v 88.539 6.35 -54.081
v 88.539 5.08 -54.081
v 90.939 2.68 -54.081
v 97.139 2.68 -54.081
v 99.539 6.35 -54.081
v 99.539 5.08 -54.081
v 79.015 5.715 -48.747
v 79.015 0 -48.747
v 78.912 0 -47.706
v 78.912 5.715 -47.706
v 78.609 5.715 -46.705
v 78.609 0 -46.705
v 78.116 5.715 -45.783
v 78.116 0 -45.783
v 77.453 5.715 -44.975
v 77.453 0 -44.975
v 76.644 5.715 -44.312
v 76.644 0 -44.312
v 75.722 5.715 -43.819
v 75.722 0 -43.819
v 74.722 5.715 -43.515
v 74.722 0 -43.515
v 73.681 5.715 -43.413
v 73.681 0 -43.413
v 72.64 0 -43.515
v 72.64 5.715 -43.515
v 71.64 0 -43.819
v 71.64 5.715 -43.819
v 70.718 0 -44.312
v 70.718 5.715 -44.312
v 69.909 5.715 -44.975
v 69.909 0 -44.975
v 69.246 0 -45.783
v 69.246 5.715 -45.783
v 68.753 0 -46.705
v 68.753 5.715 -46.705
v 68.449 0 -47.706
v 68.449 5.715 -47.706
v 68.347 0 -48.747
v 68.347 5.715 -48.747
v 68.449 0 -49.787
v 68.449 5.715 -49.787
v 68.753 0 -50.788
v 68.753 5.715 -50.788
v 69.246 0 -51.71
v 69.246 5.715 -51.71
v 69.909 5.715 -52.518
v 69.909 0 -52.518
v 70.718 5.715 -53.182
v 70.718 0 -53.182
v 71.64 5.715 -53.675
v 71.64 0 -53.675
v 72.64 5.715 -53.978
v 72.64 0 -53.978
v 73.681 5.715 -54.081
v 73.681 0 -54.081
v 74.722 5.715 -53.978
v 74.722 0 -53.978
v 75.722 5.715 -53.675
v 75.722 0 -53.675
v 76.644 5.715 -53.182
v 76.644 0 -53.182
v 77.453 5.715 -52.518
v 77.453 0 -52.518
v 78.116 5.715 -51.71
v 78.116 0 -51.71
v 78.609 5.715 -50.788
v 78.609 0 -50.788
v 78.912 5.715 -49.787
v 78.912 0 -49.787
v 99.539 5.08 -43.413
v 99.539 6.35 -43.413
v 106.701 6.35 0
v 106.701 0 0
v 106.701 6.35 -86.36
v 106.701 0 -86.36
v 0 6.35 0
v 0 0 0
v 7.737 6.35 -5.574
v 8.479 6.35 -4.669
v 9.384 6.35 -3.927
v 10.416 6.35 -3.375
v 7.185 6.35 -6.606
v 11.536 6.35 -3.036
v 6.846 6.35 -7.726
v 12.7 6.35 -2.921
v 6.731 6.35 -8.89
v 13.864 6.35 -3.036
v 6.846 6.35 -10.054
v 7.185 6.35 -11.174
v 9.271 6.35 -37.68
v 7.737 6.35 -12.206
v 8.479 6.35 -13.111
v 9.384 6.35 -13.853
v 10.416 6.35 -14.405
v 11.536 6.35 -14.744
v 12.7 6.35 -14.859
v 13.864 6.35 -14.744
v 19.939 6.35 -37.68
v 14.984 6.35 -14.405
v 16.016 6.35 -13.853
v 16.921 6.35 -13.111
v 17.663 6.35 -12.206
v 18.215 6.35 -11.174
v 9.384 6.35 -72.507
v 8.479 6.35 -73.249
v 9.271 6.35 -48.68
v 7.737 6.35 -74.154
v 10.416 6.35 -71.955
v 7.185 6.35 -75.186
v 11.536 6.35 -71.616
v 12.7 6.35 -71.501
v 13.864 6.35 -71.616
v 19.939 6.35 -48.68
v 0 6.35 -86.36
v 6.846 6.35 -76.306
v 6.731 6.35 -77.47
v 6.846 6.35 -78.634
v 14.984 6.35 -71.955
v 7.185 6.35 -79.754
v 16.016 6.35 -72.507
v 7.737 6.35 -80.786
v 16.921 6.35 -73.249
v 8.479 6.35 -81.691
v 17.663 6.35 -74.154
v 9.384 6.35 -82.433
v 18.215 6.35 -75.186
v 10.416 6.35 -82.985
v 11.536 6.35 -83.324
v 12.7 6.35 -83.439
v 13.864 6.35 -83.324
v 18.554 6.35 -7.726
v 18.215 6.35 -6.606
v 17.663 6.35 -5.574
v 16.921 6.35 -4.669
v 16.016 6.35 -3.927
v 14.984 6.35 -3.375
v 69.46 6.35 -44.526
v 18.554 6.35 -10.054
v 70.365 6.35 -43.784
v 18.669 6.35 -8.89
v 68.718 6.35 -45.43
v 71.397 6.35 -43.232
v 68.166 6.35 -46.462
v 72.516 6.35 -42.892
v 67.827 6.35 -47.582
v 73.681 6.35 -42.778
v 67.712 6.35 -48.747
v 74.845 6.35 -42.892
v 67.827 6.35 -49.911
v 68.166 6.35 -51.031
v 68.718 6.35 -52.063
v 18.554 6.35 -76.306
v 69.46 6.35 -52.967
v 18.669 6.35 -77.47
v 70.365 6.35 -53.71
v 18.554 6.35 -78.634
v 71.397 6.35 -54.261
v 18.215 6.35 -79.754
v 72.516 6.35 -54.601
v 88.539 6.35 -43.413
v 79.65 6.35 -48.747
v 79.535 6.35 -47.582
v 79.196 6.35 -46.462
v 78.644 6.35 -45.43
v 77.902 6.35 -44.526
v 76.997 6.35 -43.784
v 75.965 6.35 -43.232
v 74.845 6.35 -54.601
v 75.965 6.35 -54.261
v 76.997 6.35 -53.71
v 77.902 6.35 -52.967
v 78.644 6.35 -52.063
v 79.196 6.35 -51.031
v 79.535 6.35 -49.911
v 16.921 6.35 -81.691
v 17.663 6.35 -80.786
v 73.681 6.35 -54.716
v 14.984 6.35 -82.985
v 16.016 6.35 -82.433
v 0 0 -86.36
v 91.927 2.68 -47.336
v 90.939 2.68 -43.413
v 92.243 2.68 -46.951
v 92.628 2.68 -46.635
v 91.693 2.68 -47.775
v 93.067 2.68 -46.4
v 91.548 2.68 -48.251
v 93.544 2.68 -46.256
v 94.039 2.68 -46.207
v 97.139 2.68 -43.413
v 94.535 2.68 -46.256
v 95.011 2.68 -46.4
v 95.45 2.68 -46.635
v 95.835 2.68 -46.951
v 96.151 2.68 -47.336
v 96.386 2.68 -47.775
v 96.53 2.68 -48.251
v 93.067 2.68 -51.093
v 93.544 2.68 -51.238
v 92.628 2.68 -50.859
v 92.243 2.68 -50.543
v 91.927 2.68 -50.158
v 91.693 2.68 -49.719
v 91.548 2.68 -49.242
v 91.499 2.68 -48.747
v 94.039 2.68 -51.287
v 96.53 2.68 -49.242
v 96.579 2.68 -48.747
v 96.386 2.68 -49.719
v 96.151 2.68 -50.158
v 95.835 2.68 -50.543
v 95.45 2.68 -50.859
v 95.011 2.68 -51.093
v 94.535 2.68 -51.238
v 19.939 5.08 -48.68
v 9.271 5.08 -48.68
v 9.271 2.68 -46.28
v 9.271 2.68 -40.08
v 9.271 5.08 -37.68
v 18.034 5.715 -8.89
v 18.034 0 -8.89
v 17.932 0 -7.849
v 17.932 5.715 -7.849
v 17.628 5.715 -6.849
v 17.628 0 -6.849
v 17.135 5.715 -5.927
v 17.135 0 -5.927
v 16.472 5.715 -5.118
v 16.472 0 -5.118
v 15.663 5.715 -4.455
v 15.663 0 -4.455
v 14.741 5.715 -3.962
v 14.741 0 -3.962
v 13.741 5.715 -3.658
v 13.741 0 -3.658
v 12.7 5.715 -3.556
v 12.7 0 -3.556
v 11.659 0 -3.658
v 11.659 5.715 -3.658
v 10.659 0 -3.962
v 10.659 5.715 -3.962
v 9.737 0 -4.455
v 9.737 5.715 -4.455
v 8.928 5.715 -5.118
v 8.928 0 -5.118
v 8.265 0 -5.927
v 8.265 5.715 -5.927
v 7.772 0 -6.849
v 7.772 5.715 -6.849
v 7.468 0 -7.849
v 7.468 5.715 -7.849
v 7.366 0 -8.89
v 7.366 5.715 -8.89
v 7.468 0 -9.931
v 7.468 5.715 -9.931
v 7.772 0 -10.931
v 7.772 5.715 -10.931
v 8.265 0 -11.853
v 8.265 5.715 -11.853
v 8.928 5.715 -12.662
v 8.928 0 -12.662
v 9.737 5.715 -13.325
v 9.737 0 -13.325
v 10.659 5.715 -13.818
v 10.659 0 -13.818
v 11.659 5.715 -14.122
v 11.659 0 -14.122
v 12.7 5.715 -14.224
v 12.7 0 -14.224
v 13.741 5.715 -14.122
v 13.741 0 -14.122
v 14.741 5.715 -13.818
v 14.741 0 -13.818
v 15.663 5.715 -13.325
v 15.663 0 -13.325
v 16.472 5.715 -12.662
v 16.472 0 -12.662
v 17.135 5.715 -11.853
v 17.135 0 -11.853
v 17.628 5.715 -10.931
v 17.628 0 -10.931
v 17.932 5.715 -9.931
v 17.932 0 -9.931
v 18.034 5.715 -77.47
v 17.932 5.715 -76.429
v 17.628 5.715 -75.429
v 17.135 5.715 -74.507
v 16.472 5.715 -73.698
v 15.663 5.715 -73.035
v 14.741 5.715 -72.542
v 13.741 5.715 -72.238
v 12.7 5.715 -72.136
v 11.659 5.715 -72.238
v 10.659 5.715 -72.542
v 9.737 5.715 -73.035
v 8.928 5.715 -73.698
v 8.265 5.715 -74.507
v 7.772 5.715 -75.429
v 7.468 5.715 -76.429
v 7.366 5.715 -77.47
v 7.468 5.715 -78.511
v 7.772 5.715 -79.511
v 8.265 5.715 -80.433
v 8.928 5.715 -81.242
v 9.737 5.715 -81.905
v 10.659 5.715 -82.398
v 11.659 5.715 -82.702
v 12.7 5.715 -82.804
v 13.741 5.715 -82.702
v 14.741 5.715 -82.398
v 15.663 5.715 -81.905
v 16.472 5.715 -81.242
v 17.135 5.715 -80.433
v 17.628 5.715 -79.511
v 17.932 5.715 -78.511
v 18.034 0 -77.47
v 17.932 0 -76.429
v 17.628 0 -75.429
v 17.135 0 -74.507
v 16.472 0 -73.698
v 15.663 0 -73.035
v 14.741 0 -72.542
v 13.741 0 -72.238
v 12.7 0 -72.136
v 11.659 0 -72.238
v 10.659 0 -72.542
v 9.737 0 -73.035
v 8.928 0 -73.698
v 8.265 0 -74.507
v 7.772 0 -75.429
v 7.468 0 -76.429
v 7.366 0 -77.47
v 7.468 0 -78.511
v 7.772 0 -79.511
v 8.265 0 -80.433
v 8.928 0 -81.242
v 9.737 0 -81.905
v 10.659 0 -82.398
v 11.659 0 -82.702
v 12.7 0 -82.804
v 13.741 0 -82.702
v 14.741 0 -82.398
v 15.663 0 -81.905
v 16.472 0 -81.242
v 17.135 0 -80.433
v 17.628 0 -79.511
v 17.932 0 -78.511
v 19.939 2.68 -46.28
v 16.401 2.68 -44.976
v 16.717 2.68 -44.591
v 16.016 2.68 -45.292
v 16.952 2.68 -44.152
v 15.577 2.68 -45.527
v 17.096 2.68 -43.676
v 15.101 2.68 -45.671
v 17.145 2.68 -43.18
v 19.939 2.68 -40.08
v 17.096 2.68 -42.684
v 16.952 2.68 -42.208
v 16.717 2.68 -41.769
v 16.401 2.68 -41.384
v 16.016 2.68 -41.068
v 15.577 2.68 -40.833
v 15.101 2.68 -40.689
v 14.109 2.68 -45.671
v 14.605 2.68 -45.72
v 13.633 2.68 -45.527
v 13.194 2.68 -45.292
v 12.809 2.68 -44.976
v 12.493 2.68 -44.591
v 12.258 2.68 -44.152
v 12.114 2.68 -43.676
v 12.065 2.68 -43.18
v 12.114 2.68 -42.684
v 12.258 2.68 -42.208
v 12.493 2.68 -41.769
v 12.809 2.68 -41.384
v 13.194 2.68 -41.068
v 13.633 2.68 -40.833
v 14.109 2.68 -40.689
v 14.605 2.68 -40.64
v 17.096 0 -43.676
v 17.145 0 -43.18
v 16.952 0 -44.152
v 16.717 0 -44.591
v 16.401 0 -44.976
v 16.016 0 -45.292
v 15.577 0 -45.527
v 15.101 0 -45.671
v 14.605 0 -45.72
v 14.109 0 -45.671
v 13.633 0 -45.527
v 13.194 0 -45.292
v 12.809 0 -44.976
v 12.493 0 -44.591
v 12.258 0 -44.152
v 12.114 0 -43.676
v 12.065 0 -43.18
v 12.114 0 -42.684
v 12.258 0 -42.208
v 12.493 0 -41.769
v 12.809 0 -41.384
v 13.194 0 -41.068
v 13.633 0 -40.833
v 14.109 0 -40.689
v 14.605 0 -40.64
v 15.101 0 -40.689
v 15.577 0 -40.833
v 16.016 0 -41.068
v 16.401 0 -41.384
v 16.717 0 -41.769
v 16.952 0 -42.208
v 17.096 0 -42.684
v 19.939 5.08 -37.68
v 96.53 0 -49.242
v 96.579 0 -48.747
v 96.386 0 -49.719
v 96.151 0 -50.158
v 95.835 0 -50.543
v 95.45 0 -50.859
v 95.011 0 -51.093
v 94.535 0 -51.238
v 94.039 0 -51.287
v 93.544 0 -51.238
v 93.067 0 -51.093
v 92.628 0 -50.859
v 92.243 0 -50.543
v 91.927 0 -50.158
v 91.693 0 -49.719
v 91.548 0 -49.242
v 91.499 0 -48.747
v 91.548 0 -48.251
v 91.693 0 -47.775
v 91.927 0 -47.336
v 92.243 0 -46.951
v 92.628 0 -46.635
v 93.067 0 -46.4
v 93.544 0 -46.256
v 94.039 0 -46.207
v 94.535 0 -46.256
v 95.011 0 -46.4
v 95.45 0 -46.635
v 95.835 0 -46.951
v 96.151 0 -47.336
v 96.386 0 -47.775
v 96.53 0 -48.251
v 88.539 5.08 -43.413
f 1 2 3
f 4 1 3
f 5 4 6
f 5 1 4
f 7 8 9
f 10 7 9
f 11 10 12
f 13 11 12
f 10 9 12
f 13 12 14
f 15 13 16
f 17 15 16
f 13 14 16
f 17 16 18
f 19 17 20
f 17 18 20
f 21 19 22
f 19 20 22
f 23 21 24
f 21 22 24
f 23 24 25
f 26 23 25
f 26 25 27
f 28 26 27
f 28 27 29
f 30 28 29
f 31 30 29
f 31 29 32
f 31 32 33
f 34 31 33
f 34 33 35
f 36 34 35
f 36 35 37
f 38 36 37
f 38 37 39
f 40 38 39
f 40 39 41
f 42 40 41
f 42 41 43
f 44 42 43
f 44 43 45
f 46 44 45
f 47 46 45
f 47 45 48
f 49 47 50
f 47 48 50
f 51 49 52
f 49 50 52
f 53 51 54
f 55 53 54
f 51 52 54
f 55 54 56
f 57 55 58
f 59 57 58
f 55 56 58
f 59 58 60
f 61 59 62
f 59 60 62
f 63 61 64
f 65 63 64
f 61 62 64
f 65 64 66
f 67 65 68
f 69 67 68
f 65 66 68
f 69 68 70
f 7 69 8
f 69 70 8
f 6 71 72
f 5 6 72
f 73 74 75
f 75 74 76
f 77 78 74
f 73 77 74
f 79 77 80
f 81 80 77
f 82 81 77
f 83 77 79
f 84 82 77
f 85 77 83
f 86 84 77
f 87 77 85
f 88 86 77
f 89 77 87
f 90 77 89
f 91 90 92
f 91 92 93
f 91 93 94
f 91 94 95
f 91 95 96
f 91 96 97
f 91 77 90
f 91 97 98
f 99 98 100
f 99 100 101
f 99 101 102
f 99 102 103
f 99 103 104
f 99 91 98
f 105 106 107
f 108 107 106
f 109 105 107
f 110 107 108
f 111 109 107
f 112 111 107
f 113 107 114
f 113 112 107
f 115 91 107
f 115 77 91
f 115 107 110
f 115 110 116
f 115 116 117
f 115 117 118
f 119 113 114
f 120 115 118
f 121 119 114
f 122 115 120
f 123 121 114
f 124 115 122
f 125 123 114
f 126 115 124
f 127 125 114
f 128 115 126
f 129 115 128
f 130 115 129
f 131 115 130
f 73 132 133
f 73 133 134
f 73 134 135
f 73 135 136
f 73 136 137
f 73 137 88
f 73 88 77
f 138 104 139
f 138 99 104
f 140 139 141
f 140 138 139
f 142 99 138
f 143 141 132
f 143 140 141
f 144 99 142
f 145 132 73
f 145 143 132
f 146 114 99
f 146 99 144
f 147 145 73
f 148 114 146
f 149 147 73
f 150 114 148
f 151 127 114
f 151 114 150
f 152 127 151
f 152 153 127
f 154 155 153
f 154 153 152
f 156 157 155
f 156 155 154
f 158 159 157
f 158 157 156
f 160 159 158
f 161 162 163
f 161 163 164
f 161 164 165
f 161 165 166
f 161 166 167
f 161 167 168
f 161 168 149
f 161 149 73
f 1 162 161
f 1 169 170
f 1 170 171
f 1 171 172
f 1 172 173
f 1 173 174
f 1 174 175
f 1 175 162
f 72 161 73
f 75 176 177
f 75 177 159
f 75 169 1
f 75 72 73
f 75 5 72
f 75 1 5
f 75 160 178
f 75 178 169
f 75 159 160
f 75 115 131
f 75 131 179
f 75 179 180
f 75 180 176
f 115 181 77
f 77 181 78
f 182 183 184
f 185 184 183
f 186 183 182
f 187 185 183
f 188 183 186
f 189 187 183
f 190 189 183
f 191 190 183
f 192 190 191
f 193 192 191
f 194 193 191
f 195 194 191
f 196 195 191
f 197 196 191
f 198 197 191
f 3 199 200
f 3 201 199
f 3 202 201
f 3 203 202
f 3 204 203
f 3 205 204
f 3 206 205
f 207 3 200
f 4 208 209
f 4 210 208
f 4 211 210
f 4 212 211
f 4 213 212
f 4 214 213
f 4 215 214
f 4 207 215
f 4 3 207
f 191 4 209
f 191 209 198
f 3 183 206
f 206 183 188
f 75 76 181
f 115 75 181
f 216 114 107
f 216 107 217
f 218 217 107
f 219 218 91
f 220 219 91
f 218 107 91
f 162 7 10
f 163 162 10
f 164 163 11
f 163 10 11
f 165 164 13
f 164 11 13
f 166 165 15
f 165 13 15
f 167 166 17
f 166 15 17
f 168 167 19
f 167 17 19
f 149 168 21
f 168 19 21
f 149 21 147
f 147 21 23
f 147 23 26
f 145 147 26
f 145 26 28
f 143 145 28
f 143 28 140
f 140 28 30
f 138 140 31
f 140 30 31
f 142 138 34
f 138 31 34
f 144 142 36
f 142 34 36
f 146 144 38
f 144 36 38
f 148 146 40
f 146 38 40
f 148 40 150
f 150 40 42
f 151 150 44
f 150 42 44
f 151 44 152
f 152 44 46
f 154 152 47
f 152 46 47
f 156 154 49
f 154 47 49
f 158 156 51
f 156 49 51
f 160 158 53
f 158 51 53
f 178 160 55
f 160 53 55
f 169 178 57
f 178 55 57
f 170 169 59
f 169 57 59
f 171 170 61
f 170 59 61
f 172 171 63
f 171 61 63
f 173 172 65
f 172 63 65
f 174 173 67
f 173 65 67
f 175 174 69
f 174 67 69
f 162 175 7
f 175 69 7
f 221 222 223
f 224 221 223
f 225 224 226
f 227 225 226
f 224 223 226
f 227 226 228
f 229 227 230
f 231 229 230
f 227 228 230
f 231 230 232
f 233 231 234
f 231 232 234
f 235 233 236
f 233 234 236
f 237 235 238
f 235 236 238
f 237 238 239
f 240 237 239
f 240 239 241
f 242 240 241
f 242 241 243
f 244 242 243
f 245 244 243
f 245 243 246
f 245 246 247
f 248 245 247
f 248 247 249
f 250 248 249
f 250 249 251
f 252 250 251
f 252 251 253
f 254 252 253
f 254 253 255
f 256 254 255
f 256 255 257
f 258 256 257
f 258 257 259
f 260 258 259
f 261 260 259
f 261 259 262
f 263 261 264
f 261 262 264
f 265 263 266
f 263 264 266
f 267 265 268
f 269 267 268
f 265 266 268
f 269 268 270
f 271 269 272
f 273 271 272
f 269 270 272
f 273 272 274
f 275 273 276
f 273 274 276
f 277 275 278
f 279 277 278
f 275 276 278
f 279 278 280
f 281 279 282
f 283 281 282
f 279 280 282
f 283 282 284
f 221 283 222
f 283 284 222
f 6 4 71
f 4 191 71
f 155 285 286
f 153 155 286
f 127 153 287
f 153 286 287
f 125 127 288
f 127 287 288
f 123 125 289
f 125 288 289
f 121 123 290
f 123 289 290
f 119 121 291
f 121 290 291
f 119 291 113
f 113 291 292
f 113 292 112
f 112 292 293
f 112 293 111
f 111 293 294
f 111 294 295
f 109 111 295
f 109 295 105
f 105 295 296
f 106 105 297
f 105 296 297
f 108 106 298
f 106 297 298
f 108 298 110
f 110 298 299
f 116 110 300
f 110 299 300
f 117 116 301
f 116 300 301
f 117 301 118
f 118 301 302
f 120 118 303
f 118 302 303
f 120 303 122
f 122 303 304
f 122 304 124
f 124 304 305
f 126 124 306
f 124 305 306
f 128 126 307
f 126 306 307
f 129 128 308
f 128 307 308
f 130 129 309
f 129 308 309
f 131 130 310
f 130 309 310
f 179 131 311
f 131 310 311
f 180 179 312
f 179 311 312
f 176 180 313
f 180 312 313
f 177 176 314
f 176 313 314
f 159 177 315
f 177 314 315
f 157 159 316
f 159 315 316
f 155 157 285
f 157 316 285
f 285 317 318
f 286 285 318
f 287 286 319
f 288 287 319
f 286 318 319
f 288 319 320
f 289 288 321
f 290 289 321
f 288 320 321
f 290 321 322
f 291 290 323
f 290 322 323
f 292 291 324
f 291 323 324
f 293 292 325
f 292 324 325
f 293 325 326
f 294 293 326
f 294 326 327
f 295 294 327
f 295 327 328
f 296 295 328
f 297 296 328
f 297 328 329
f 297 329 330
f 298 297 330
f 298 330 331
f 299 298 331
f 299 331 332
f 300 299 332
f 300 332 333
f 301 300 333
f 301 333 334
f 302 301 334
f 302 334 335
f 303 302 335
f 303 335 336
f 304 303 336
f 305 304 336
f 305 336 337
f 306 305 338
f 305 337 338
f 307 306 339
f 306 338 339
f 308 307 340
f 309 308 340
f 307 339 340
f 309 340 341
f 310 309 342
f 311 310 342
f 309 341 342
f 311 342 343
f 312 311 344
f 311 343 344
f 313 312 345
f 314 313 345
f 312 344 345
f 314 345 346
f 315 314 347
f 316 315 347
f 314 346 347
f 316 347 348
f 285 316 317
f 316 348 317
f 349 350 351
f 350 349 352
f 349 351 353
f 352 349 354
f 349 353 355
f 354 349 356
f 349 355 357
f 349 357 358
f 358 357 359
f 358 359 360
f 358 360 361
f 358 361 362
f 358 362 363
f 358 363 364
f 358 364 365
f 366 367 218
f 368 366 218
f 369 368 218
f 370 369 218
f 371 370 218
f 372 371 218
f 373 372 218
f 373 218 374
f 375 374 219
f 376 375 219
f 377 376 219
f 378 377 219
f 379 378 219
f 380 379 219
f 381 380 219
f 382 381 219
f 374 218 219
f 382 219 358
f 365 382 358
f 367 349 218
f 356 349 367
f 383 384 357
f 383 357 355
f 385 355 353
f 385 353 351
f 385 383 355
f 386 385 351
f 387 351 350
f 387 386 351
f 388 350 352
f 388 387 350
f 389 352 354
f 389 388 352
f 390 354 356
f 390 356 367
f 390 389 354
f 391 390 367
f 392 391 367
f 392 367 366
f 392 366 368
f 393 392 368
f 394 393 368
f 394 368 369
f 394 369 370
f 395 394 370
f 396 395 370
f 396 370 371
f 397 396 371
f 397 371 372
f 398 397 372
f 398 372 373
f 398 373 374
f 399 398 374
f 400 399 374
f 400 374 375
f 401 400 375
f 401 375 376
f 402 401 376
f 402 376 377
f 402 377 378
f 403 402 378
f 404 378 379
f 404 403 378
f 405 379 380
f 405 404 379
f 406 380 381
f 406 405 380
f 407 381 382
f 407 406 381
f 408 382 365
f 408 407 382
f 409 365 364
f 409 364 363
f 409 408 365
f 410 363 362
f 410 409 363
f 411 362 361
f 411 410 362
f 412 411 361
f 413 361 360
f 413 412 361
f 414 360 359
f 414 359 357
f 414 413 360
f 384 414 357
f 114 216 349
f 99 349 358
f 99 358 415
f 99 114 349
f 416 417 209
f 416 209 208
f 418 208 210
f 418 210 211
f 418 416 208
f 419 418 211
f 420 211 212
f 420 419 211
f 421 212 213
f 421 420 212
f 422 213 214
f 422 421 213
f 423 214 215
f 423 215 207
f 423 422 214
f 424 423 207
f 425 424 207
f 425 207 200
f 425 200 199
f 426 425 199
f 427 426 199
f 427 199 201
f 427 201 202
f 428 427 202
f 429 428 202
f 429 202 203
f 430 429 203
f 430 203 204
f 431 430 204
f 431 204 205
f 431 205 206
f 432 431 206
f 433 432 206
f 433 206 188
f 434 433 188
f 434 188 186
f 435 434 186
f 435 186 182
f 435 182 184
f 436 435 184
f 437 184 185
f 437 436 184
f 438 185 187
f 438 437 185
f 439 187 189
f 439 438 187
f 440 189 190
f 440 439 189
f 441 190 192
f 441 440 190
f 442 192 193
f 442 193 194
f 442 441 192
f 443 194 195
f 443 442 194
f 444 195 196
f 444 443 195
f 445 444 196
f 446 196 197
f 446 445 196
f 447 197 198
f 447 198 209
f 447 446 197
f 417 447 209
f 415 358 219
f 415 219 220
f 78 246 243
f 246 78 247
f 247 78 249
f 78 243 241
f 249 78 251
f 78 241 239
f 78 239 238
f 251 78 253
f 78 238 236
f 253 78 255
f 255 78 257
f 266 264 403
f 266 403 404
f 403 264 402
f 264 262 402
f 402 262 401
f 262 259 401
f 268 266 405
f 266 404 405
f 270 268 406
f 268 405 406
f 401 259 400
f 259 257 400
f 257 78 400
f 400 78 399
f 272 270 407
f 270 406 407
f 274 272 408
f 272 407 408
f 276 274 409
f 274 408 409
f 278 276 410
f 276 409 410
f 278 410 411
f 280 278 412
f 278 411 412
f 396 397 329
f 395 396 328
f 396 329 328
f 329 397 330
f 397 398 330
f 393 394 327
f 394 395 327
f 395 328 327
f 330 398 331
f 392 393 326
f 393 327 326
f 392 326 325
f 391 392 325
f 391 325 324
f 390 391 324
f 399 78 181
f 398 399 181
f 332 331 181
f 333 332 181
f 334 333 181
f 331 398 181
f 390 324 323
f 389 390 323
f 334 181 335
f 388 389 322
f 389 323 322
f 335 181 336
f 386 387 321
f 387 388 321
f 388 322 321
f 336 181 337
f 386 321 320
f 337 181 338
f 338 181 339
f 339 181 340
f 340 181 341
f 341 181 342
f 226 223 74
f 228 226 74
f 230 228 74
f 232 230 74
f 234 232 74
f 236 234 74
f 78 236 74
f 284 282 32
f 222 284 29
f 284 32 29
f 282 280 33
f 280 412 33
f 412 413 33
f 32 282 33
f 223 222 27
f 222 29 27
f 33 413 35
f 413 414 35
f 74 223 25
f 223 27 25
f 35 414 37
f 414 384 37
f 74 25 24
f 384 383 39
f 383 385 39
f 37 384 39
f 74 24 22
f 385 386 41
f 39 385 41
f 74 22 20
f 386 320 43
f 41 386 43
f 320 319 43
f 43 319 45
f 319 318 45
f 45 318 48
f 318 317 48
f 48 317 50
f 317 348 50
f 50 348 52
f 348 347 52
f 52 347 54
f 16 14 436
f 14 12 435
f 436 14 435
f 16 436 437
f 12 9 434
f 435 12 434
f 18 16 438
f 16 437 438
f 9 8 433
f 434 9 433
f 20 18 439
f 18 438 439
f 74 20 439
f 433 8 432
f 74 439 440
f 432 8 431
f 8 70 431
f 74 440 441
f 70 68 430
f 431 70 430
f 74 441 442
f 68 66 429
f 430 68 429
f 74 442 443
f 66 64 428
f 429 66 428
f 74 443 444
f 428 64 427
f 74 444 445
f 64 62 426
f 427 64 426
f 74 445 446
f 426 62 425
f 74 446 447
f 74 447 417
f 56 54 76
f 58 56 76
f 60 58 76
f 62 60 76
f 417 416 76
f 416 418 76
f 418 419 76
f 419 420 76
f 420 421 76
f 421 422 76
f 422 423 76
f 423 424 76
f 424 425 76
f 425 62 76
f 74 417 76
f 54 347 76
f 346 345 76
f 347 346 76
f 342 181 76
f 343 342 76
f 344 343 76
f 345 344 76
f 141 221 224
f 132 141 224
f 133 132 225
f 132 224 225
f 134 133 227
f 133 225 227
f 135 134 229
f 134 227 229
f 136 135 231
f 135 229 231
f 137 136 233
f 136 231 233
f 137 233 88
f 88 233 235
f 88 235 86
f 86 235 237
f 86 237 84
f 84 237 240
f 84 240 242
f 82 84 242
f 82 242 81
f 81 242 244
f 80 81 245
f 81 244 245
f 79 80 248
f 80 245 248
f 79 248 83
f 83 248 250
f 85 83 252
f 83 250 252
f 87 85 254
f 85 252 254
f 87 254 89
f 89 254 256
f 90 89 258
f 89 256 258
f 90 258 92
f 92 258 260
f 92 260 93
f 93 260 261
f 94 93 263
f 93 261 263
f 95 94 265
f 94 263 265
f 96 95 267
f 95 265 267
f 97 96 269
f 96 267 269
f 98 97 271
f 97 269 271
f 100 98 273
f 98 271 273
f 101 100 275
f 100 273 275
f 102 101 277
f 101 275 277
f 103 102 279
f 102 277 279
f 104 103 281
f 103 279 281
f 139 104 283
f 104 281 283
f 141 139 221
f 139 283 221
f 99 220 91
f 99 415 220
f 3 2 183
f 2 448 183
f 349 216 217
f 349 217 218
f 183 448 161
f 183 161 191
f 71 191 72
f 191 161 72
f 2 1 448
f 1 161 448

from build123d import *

# Parameters (mm, degrees)
SKETCH1_R               = 2.54
BOSS_EXTRUDE1_DEPTH     = 6.35
CUT_EXTRUDE1_DEPTH      = 5.334
CUT_EXTRUDE1_DEPTH_BACK = 5.334
CUT_EXTRUDE2_DEPTH      = 5.334
CUT_EXTRUDE2_DEPTH_BACK = 5.334
SKETCH6_R               = 5.334
CUT_EXTRUDE3_DEPTH      = 7.35
CHAMFER1_SIZE           = 0.635


with BuildPart() as part:
    # Sketch1 → Boss-Extrude1 (new body)
    with BuildSketch(Plane(origin=(0, 0, 0), x_dir=(1, 0, 0), z_dir=(0, 1, 0))):
        Polygon((0, 33.02), (0, 0), (22.86, 0), (106.700989027, 0), (106.700989027, 38.586695169), (106.700989027, 56.366695169), (106.700989027, 86.36), (20.32, 86.36), (0, 86.36), (0, 53.34), align=None)
        with Locations((14.605, 43.18)):
            Circle(SKETCH1_R, mode=Mode.SUBTRACT)
        with Locations((94.039183737, 48.746695169)):
            Circle(SKETCH1_R, mode=Mode.SUBTRACT)
    extrude(amount=BOSS_EXTRUDE1_DEPTH)

    # Sketch4 → Cut-Extrude1 (cut, two sides)
    with BuildSketch(Plane.ZY.offset(-14.605)) as cut_extrude1_sk:
        Polygon((-46.28, 2.68), (-40.08, 2.68), (-37.68, 5.08), (-37.68, 6.35), (-48.68, 6.35), (-48.68, 5.08), align=None)
    extrude(amount=CUT_EXTRUDE1_DEPTH, mode=Mode.SUBTRACT)
    extrude(cut_extrude1_sk.sketch, amount=-CUT_EXTRUDE1_DEPTH_BACK, mode=Mode.SUBTRACT)

    # Sketch5 → Cut-Extrude2 (cut, two sides)
    with BuildSketch(Plane.XY.offset(-48.746695169)) as cut_extrude2_sk:
        Polygon((90.939183737, 2.68), (97.139183737, 2.68), (99.539183737, 5.08), (99.539183737, 6.35), (88.539183737, 6.35), (88.539183737, 5.08), align=None)
    extrude(amount=CUT_EXTRUDE2_DEPTH, mode=Mode.SUBTRACT)
    extrude(cut_extrude2_sk.sketch, amount=-CUT_EXTRUDE2_DEPTH_BACK, mode=Mode.SUBTRACT)

    # Sketch6 → Cut-Extrude3 (cut, through all)
    with BuildSketch(Plane.XZ):
        with Locations((12.7, -8.89)):
            Circle(SKETCH6_R)
        with Locations((73.680989027, -48.746695169)):
            Circle(SKETCH6_R)
        with Locations((12.7, -77.47)):
            Circle(SKETCH6_R)
    extrude(amount=-CUT_EXTRUDE3_DEPTH, mode=Mode.SUBTRACT)

    # Chamfer1
    chamfer1_edges = [part.edges().sort_by_distance(p)[0] for p in [
        (7.366, 6.35, -8.89),
        (68.346989027, 6.35, -48.746695169),
        (7.366, 6.35, -77.47),
    ]]
    chamfer(chamfer1_edges, length=CHAMFER1_SIZE)


solid = part.part
